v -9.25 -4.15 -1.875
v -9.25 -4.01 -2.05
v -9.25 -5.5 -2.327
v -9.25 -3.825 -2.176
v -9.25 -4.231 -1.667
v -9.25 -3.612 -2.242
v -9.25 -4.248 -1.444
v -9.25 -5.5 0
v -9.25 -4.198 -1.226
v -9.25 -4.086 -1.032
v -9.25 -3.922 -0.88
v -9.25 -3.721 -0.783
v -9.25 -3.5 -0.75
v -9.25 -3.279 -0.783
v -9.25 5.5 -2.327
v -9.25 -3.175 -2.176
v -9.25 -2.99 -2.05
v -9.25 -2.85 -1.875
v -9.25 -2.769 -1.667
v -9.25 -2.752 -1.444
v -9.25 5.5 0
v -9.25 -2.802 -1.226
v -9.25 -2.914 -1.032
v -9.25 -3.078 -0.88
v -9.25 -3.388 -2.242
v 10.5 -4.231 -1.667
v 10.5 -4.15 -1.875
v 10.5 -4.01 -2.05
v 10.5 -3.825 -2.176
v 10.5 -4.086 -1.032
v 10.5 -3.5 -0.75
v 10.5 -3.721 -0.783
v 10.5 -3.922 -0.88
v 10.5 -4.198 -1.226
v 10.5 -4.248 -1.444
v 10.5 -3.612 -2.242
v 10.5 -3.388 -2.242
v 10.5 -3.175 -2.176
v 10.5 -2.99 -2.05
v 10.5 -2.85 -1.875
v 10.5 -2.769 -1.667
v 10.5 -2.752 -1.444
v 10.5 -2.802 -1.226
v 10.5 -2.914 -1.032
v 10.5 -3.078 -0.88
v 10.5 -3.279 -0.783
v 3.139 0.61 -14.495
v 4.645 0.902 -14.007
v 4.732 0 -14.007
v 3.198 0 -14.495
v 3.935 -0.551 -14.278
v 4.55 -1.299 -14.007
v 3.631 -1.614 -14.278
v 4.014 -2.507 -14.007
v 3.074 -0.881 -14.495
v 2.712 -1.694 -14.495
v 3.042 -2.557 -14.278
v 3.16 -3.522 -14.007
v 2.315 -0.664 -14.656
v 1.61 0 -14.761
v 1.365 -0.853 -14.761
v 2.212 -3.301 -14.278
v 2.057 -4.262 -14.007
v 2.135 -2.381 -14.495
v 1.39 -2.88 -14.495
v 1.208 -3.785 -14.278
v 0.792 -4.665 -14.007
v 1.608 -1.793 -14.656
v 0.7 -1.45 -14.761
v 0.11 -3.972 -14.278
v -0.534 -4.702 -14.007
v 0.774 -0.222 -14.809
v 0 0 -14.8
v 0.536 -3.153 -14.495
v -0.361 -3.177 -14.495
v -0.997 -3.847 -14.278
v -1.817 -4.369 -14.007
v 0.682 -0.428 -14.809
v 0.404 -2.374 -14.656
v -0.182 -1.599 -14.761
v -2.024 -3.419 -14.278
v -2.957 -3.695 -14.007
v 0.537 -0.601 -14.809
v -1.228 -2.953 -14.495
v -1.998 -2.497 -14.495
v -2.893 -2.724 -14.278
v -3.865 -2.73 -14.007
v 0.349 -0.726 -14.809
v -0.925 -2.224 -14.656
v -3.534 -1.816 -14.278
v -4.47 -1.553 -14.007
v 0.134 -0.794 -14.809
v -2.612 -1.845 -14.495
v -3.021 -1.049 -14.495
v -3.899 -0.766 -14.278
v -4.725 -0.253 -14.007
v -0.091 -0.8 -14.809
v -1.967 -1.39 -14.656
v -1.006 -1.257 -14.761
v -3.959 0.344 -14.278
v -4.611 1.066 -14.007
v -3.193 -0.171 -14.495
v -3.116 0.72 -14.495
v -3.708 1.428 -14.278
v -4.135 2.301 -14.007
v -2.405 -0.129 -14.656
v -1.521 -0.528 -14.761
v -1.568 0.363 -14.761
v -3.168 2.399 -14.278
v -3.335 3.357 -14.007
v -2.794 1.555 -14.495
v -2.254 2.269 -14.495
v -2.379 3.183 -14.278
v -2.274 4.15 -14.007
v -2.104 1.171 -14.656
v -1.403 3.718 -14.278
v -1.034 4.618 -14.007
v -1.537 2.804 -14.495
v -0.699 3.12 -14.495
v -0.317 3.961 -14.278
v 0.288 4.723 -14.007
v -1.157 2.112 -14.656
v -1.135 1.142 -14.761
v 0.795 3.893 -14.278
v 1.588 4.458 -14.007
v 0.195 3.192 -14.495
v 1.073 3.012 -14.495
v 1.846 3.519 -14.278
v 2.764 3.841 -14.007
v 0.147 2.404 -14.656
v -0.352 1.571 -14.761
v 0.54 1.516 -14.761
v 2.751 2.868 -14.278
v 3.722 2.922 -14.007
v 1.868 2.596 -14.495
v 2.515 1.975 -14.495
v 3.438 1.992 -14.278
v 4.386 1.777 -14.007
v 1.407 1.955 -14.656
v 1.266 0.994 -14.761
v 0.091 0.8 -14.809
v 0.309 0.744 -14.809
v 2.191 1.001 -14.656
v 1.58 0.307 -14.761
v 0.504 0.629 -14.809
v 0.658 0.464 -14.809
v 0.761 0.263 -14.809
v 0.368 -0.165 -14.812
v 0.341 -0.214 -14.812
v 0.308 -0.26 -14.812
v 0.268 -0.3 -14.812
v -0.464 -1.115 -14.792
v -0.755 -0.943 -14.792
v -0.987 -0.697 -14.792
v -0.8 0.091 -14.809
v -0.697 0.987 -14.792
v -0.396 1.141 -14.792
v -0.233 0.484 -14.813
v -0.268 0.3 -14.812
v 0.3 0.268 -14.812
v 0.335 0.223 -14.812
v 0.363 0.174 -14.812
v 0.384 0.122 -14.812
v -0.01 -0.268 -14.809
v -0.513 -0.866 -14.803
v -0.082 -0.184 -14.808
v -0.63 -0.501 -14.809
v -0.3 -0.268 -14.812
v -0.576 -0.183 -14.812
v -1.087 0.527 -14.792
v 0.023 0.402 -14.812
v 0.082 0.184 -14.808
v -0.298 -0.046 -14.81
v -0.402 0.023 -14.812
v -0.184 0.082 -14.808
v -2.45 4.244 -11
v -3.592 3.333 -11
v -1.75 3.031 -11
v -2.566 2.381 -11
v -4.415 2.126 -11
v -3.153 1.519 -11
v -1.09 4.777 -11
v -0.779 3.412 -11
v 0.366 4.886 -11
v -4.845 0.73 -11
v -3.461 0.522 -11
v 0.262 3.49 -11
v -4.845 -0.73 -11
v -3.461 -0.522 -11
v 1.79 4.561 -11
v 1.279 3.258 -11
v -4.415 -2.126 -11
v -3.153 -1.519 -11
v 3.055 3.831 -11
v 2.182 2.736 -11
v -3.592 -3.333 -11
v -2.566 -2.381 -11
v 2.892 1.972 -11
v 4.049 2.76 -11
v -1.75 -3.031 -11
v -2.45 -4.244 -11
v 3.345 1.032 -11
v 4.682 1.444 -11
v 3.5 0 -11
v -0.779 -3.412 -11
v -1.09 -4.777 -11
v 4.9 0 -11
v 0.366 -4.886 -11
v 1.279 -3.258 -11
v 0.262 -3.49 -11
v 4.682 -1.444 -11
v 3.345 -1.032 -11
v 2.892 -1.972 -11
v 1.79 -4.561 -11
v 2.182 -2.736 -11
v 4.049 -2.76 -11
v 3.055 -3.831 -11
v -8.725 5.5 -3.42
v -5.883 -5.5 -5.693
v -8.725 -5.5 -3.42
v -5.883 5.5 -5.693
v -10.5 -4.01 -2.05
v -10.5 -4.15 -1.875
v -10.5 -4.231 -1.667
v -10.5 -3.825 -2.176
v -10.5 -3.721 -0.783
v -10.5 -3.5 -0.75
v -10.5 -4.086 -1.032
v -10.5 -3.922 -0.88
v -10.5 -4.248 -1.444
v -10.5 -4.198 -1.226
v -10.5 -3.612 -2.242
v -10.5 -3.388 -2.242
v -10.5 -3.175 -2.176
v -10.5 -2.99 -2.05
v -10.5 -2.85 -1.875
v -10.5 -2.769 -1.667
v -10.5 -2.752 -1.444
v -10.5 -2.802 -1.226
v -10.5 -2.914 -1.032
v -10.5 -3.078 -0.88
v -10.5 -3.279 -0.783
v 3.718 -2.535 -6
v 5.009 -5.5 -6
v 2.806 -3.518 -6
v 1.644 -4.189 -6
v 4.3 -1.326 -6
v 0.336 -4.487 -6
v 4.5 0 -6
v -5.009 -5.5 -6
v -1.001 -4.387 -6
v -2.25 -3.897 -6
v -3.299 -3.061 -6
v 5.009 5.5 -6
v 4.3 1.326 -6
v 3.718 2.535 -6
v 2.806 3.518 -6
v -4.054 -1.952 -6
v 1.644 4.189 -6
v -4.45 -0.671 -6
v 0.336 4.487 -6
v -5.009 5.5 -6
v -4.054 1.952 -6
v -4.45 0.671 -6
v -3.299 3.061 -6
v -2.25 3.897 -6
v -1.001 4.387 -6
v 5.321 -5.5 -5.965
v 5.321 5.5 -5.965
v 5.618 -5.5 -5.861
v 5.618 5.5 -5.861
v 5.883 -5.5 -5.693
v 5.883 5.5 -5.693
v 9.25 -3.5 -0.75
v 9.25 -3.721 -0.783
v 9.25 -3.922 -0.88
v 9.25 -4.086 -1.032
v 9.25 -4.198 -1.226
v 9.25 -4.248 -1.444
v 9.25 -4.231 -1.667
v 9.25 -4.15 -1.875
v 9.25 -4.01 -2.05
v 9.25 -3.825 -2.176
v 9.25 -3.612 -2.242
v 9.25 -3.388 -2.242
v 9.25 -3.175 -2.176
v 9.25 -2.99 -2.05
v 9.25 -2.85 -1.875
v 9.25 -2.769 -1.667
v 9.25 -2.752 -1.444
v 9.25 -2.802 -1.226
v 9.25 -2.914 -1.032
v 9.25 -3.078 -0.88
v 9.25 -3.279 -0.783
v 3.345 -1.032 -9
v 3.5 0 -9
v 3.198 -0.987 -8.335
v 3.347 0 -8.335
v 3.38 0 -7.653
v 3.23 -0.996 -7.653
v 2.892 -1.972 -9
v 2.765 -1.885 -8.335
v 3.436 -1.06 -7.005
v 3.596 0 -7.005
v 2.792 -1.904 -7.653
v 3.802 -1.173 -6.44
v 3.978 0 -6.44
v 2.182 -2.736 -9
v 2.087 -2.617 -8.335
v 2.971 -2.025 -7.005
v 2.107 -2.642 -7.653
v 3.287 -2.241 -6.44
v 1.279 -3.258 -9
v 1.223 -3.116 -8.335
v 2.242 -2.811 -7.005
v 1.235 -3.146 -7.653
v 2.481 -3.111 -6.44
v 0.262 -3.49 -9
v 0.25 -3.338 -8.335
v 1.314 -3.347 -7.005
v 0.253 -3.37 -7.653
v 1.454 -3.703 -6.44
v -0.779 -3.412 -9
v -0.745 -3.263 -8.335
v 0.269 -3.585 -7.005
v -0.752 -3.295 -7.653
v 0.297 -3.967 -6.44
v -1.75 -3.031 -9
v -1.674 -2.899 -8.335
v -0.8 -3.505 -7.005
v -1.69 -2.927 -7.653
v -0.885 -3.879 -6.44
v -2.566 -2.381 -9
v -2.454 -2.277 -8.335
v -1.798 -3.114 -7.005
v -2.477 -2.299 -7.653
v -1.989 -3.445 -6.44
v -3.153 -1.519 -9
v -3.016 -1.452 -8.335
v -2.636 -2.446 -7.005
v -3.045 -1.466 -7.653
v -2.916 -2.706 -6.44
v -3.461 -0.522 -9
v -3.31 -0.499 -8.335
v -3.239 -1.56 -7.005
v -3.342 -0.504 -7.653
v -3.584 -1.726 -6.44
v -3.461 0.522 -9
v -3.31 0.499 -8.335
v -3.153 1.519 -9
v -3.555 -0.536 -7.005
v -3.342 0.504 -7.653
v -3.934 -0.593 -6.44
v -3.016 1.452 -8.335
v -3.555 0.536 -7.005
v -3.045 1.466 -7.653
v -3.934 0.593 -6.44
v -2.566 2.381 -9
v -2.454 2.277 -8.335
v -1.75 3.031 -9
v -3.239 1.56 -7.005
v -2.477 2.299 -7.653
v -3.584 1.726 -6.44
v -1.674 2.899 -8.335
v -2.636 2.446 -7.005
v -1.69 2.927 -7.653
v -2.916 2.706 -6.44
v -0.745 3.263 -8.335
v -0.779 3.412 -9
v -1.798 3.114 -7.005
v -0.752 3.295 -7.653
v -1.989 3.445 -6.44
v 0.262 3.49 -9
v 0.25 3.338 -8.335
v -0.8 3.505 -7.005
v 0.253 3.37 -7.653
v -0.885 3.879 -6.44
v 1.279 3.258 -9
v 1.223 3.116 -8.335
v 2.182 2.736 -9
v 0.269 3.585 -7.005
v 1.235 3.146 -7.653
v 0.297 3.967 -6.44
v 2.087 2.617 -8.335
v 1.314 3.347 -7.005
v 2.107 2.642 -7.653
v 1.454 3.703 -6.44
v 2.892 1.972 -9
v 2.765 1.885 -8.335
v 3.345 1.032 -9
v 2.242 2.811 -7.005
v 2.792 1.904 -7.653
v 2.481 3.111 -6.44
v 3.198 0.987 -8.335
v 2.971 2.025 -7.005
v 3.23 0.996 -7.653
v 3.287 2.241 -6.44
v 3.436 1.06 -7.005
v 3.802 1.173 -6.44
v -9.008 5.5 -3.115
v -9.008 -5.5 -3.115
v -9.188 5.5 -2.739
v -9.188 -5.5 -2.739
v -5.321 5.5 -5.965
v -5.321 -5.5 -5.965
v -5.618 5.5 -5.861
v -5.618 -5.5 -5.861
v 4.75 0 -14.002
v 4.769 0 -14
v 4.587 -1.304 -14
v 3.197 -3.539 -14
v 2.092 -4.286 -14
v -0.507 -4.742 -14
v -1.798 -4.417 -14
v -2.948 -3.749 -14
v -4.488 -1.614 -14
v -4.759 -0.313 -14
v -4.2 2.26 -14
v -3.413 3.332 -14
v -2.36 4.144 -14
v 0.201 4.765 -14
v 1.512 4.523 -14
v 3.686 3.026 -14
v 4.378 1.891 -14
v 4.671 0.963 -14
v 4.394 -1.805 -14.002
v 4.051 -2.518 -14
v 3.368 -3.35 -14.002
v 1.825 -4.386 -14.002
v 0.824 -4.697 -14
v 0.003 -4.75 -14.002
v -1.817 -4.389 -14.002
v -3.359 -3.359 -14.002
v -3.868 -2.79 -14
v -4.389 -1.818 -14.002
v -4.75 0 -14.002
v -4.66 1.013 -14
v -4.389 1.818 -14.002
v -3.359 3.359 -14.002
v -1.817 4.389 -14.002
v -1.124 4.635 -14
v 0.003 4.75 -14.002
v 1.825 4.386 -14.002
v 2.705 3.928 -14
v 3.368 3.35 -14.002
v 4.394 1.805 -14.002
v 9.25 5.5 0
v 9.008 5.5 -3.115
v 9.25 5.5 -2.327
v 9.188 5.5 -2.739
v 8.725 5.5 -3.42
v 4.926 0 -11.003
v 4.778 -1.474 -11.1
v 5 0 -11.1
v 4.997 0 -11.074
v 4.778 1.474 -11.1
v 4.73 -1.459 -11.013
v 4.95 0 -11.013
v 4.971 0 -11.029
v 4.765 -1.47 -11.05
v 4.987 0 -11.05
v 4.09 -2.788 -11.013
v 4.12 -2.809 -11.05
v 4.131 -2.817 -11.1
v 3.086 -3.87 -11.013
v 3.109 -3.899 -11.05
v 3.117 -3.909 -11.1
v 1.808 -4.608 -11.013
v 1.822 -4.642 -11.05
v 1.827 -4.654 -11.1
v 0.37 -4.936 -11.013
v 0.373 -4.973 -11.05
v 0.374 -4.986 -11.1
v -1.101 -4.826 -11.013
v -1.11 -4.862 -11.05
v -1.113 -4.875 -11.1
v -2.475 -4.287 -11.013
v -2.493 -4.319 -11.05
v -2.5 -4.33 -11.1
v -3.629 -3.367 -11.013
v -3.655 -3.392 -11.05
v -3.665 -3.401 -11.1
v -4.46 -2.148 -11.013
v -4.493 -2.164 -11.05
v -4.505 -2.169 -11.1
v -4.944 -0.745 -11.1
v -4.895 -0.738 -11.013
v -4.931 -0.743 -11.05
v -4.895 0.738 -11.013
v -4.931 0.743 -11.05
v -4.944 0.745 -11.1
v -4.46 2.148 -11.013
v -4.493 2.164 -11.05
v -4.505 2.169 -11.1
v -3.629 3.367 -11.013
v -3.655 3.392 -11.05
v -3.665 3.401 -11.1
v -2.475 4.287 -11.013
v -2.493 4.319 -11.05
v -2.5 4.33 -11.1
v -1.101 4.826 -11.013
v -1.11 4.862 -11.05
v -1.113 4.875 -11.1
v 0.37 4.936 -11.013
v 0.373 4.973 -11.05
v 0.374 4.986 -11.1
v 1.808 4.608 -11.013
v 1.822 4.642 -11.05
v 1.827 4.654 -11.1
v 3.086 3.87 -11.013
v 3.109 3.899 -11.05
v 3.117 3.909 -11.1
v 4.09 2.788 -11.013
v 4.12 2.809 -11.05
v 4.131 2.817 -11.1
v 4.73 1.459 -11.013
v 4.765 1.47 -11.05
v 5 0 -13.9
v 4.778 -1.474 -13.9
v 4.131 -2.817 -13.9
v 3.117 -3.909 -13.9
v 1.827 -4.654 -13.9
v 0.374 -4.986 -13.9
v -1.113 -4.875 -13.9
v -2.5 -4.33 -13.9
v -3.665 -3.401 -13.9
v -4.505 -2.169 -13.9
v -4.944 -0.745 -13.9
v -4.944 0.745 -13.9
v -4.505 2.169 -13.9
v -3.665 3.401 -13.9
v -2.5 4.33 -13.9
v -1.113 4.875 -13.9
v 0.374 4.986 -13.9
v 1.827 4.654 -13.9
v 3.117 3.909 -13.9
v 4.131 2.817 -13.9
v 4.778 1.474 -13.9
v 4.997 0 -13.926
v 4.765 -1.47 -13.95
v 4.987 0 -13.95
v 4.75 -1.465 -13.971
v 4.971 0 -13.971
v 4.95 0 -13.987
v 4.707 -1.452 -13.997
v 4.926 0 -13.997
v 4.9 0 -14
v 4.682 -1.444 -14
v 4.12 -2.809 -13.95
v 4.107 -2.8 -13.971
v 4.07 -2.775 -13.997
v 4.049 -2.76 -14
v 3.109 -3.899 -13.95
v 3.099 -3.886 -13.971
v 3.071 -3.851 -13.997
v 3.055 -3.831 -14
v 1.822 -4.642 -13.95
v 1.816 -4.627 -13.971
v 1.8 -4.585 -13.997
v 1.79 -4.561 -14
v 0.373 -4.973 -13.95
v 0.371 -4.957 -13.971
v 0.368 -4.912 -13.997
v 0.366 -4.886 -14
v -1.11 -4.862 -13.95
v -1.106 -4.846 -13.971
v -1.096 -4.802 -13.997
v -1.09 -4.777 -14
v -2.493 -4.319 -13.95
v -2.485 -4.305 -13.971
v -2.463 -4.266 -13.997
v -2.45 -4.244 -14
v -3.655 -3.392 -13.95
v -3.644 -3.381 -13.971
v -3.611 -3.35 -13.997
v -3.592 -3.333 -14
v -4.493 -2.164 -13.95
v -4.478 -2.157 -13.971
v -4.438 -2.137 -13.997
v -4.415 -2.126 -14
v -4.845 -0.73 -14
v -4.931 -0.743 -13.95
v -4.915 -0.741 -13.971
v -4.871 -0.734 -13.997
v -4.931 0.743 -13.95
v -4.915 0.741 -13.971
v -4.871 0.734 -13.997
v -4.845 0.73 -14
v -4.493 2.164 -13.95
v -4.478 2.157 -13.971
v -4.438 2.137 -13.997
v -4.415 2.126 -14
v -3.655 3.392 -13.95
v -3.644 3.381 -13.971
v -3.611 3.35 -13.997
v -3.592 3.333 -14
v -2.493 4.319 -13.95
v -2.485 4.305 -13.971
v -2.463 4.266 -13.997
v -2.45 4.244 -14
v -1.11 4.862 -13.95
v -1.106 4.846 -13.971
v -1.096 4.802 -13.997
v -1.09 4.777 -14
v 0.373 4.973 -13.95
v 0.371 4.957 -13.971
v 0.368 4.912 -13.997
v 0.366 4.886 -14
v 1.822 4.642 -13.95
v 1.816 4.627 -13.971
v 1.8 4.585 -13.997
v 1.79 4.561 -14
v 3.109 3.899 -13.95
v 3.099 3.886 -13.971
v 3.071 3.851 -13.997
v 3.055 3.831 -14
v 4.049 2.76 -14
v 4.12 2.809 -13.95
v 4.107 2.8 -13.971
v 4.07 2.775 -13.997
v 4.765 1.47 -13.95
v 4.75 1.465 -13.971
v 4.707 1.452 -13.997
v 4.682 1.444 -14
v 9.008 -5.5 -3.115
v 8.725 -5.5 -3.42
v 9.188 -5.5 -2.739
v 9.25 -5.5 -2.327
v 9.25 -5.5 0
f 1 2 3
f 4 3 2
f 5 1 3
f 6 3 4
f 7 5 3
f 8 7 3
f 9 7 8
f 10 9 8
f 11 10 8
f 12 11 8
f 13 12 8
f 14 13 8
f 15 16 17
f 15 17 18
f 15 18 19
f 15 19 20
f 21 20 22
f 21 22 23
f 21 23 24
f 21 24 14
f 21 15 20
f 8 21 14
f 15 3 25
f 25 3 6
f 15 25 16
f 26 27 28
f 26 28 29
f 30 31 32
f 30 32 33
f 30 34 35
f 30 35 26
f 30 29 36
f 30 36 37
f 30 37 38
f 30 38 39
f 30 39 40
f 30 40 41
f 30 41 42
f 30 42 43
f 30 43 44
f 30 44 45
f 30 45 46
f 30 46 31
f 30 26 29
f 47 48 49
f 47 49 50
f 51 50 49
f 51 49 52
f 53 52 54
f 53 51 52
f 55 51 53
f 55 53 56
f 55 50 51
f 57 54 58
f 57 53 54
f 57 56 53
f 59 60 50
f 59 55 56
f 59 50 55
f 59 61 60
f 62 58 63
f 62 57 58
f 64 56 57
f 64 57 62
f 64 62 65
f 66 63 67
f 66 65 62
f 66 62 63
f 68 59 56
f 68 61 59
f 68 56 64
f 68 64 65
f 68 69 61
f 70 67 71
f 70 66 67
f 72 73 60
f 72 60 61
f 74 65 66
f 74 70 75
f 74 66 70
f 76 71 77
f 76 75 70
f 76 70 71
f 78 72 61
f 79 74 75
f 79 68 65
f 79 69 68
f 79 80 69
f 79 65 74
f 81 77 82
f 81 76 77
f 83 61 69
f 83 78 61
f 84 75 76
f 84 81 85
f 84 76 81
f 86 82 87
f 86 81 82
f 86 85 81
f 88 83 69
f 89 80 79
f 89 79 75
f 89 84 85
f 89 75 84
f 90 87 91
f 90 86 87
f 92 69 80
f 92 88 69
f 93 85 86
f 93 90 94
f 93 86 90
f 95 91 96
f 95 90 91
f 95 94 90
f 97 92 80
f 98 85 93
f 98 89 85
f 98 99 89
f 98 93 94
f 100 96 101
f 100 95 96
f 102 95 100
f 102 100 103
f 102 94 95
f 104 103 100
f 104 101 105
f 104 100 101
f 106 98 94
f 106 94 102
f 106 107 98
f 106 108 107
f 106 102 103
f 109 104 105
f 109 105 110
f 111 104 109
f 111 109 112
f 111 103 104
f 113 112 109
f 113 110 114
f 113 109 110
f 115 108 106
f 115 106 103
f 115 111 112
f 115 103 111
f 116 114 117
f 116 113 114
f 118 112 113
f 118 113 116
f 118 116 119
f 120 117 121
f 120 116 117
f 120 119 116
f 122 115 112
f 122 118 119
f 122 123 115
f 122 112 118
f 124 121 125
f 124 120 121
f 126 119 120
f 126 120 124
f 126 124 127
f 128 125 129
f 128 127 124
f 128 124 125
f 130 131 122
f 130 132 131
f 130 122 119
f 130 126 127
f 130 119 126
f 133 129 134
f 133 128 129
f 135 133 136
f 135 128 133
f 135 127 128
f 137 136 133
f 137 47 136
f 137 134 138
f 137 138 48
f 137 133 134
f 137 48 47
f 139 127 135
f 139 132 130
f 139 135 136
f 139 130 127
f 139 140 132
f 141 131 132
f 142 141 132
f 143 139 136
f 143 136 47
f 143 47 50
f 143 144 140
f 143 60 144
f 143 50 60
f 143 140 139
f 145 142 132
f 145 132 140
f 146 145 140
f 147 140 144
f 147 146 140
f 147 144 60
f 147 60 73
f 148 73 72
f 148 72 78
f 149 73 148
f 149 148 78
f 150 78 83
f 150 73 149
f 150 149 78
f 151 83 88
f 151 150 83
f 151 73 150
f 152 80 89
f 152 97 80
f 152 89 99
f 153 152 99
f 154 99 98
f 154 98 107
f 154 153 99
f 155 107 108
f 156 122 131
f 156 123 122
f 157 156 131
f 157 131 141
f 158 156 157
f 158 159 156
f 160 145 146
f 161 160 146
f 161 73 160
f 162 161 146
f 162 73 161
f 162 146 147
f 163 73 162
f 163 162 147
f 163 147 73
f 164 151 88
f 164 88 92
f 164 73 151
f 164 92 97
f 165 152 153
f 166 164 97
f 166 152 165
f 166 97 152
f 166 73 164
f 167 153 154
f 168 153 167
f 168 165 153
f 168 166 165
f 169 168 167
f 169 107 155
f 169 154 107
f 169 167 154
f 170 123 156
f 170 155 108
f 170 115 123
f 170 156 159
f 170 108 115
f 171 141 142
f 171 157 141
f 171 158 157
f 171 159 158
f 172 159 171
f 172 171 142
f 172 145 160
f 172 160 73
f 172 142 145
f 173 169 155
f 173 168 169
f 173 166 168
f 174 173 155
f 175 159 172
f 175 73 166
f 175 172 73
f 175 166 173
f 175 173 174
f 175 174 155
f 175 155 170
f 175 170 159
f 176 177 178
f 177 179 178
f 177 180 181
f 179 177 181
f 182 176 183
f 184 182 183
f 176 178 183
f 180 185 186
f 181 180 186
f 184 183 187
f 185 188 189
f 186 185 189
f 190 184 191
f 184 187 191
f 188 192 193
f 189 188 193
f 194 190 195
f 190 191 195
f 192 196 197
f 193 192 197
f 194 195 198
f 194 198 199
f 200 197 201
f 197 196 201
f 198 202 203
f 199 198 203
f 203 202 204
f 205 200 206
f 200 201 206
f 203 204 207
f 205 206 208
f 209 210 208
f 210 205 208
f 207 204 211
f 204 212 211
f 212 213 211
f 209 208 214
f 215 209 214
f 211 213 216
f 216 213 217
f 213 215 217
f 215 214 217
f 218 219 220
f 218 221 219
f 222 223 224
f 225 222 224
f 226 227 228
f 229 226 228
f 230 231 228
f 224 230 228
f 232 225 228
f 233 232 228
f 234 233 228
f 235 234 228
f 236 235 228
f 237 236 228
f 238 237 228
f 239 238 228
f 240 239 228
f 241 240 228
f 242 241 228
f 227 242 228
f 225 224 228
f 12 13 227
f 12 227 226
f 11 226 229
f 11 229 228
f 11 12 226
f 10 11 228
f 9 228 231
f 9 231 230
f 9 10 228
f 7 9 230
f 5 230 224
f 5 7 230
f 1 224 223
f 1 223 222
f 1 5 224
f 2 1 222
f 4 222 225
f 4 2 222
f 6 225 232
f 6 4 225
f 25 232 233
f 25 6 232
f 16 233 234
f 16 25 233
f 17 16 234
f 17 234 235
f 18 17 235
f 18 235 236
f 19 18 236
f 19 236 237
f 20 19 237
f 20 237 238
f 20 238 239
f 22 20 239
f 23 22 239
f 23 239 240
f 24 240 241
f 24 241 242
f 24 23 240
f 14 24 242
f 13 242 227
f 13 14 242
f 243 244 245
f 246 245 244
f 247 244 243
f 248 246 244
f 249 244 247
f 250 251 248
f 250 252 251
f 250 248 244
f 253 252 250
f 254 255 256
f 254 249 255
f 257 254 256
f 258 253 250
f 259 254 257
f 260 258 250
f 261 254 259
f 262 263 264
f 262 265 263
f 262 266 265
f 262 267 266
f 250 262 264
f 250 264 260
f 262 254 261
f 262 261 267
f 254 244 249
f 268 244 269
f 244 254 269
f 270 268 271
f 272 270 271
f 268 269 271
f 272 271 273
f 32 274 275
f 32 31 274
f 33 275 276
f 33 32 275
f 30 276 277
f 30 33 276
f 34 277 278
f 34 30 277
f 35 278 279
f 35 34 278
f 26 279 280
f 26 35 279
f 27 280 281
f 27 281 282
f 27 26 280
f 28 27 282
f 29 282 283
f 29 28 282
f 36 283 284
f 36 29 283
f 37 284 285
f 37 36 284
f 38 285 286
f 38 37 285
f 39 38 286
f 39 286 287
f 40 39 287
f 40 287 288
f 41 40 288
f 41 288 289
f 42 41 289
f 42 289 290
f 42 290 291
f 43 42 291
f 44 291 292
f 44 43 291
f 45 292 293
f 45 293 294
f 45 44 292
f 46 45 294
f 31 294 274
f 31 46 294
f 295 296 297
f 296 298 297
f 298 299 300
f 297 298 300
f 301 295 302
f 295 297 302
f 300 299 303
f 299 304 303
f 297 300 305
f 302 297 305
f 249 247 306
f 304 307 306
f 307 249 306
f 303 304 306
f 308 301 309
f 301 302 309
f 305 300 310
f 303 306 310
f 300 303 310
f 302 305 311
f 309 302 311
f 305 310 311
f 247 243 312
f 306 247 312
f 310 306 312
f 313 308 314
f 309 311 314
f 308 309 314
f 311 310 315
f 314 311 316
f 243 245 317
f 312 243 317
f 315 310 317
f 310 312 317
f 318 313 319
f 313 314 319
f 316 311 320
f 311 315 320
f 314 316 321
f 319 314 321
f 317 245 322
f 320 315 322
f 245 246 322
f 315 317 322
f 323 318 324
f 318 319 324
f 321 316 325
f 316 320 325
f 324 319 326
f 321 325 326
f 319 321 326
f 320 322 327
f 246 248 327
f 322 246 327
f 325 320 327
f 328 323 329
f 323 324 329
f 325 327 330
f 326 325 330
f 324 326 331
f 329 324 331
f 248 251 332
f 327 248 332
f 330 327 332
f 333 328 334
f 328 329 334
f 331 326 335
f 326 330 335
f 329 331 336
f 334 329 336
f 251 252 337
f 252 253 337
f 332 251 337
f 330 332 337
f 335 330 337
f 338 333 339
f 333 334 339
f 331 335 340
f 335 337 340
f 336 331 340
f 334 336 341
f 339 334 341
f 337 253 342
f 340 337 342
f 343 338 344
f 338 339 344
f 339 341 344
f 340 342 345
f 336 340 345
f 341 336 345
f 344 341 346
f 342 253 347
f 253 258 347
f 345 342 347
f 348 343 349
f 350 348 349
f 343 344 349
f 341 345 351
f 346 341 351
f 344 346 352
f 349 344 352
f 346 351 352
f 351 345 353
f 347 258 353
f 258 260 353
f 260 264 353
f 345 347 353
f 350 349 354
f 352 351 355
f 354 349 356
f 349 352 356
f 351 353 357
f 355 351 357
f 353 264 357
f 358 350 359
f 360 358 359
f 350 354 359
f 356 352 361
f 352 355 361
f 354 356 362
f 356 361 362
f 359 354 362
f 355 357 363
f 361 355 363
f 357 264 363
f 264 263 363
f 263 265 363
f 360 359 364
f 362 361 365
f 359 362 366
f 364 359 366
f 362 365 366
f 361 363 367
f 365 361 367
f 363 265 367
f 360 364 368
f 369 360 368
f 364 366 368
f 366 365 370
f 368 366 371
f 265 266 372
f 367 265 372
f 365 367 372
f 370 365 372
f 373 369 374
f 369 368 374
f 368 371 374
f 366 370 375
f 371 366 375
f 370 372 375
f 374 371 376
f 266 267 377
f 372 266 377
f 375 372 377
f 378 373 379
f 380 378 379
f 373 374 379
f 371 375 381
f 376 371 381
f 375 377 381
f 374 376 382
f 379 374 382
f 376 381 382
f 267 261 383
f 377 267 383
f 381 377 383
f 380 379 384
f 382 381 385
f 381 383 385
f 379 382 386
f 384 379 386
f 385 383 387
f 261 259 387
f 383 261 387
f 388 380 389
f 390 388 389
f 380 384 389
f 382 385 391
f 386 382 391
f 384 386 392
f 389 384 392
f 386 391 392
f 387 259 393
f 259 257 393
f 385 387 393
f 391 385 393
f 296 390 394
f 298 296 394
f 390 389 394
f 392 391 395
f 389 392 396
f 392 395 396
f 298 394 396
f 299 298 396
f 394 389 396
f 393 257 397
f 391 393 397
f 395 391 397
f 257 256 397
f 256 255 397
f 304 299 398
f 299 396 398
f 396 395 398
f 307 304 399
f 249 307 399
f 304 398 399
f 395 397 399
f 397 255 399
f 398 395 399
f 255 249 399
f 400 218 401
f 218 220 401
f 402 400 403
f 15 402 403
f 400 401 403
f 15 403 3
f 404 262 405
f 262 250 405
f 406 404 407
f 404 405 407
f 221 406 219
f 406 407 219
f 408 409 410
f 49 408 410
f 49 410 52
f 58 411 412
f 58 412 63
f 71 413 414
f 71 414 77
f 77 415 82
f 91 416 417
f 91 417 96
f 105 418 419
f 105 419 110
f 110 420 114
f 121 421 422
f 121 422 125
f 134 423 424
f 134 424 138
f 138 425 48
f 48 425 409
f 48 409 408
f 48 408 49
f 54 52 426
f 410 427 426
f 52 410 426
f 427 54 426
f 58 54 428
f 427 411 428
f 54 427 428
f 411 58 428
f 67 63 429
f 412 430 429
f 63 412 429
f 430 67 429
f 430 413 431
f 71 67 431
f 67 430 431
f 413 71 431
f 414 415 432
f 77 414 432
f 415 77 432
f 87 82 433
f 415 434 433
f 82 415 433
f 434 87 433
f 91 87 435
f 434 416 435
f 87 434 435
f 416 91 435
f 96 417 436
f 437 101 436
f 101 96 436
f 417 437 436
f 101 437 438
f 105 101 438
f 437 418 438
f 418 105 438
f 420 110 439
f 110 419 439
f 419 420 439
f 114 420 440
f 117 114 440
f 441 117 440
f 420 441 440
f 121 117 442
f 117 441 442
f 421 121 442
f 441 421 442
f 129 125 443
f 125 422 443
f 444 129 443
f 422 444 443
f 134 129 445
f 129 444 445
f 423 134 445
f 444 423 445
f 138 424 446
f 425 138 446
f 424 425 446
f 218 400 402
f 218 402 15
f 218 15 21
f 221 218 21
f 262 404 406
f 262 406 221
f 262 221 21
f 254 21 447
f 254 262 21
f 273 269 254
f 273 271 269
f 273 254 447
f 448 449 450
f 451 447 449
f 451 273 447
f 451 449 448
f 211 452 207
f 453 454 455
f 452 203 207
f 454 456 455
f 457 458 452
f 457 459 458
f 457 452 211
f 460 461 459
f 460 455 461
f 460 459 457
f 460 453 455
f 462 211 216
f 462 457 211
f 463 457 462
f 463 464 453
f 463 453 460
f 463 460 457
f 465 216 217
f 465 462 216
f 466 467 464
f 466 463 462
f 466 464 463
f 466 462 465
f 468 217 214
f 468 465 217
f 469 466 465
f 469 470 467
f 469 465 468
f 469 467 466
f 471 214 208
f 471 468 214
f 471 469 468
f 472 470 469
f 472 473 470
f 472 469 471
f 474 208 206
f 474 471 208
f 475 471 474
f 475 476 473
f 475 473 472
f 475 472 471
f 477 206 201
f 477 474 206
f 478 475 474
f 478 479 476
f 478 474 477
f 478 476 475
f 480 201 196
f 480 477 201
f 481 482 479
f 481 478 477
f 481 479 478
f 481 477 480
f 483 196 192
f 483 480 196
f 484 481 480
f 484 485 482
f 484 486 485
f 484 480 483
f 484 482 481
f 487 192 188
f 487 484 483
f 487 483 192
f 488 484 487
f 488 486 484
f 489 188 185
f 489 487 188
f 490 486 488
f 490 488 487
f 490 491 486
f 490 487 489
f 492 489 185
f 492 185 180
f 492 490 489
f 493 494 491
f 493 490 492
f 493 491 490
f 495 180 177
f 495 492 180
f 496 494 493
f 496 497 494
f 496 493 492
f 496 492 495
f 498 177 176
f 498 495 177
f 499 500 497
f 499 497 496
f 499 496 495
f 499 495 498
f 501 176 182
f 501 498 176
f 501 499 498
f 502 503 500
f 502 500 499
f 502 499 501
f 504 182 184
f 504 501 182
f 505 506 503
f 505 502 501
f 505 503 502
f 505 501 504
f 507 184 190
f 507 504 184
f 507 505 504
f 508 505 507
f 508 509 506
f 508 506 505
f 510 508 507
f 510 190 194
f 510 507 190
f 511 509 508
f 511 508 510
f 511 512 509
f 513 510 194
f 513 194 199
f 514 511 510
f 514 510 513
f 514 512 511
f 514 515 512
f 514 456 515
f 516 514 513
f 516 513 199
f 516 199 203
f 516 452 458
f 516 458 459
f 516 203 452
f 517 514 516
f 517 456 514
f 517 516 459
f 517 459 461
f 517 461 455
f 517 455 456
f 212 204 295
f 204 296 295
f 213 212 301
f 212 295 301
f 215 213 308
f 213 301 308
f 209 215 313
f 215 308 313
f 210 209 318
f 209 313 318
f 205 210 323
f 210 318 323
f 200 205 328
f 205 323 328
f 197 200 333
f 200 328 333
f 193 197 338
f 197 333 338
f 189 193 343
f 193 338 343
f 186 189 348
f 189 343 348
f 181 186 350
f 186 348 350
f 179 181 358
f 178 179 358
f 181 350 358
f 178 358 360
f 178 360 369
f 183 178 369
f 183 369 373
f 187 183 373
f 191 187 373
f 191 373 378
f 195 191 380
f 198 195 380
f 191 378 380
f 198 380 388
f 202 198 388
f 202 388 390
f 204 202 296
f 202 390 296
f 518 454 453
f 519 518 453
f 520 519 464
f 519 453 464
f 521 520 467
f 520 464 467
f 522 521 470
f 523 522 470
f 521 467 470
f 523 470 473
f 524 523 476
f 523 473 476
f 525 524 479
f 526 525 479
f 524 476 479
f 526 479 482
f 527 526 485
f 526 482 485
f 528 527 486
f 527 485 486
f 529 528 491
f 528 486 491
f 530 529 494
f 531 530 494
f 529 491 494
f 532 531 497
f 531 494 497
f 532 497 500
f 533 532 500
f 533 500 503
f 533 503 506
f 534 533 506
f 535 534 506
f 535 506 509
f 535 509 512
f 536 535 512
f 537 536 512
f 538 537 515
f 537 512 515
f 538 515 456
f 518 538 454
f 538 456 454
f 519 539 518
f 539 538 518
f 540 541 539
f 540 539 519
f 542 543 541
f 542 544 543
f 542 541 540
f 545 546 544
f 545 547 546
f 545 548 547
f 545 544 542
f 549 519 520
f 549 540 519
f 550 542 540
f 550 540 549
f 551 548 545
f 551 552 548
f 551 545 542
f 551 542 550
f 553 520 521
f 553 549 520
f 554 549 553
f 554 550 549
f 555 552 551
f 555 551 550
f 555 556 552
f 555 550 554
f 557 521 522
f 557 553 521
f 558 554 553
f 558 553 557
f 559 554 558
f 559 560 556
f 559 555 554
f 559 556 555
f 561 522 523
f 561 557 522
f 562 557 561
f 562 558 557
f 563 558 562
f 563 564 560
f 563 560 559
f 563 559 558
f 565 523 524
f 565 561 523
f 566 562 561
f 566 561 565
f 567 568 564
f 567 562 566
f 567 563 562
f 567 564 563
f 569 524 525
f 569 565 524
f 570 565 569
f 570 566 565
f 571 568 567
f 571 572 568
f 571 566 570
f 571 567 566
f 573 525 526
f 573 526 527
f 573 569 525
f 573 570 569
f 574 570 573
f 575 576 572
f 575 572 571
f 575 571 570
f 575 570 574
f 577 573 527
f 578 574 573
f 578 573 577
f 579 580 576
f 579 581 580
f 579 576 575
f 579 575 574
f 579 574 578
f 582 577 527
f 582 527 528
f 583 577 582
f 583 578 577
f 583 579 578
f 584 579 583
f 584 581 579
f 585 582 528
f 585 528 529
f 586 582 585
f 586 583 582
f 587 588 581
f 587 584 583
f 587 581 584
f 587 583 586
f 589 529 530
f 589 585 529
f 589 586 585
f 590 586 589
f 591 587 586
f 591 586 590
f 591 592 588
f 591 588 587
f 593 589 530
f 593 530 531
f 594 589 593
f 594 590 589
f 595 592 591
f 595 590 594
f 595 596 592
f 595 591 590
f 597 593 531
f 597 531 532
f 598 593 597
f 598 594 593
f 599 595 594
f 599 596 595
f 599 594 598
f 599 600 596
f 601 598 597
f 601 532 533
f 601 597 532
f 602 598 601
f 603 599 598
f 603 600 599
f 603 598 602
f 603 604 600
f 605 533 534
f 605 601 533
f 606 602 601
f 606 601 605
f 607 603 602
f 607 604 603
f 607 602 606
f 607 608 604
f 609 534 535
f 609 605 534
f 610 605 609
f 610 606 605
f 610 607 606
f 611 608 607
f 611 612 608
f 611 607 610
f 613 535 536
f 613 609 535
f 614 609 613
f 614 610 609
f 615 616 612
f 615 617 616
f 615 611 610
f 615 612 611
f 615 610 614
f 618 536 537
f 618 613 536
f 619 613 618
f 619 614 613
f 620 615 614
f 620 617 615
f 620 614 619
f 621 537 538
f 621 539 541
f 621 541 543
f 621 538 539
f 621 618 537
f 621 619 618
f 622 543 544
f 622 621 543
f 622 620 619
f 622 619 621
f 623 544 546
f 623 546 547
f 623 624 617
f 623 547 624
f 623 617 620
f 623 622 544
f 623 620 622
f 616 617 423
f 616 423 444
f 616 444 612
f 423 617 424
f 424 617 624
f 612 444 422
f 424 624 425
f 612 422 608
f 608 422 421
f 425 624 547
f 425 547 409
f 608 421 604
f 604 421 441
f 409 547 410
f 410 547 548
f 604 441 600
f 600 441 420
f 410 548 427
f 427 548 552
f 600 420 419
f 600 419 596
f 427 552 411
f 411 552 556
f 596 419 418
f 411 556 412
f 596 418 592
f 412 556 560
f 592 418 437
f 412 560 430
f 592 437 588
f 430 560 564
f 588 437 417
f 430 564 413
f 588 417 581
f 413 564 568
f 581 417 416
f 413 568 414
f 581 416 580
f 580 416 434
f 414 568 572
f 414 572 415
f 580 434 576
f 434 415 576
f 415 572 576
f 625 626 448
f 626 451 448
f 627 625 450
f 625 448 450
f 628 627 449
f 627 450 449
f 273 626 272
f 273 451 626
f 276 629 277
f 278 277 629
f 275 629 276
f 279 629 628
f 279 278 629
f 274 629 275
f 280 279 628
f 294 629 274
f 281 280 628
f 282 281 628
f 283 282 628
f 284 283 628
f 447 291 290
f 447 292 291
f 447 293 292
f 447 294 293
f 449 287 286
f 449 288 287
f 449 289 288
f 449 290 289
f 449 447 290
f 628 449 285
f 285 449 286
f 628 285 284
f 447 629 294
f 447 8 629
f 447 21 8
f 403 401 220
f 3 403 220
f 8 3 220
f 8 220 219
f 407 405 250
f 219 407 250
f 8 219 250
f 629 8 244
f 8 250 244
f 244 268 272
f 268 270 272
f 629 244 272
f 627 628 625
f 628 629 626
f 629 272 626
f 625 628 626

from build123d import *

# Parameters (mm, degrees)
Y_KSEKLIK_EKSTR_ZYON1_DEPTH = 5.5
IZIM4_R                     = 0.75
Y_KSEKLIK_EKSTR_ZYON2_DEPTH = 10.5
RADYUS1_R                   = 0.1
RADYUS2_R                   = 1.4


with BuildPart() as part:
    # Çizim1 → Yükseklik-Ekstrüzyon1 (new, symmetric)
    with BuildSketch(Plane(origin=(0, 0, 0), x_dir=(1, 0, 0), z_dir=(0, 1, 0))):
        Polygon((-9.25, 0), (9.25, 0), (9.25, 3), (5.5, 6), (-5.5, 6), (-9.25, 3), align=None)
    extrude(amount=Y_KSEKLIK_EKSTR_ZYON1_DEPTH, both=True)

    # Çizim2 → Döndür1 (revolve)
    with BuildSketch(Plane(origin=(0, 0, 0), x_dir=(1, 0, 0), z_dir=(0, 1, 0))):
        with BuildLine():
            Line((0, 6), (0, 13.8))
            Line((0, 13.8), (4.5, 13.8))
            Line((4.5, 13.8), (4.5, 14))
            Line((4.5, 14), (5, 14))
            Line((5, 14), (5, 11))
            Line((5, 11), (3.5, 11))
            Line((3.5, 11), (3.5, 9))
            ThreePointArc((3.5, 9), (3.465409062, 7.321803021), (4.5, 6))
            Line((4.5, 6), (0, 6))
        make_face()
    revolve(axis=Axis((0, 0, 0), (0, 0, -1)))

    # Çizim3 → Döndür2 (revolve)
    with BuildSketch(Plane(origin=(0, 0, 0), x_dir=(1, 0, 0), z_dir=(0, 1, 0))):
        with BuildLine():
            Line((0, 13.8), (4.75, 13.8))
            Line((4.75, 13.8), (4.75, 14))
            ThreePointArc((4.75, 14), (2.417928436, 14.654887588), (0, 14.8))
            Line((0, 14.8), (0, 13.8))
        make_face()
    revolve(axis=Axis((0, 0, 0), (0, 0, -1)))

    # Çizim4 → Yükseklik-Ekstrüzyon2 (add, symmetric)
    with BuildSketch(Plane(origin=(0, 0, 0), x_dir=(0, 0, -1), z_dir=(1, 0, 0))):
        with Locations(Location((1.5, -3.5, 0), (0, 0, 180))):
            Circle(IZIM4_R)
    extrude(amount=Y_KSEKLIK_EKSTR_ZYON2_DEPTH, both=True)

    # Radyus1
    radyus1_edges = [part.edges().sort_by_distance(p)[0] for p in [
        (-5, 0, -11),
        (-5, 0, -14),
        (-4.75, 0, -14),
    ]]
    fillet(radyus1_edges, radius=RADYUS1_R)

    # Radyus2
    radyus2_edges = [part.edges().sort_by_distance(p)[0] for p in [
        (-9.25, 0, -3),
        (-5.5, 0, -6),
        (5.5, 0, -6),
        (9.25, 0, -3),
    ]]
    fillet(radyus2_edges, radius=RADYUS2_R)


solid = part.part
